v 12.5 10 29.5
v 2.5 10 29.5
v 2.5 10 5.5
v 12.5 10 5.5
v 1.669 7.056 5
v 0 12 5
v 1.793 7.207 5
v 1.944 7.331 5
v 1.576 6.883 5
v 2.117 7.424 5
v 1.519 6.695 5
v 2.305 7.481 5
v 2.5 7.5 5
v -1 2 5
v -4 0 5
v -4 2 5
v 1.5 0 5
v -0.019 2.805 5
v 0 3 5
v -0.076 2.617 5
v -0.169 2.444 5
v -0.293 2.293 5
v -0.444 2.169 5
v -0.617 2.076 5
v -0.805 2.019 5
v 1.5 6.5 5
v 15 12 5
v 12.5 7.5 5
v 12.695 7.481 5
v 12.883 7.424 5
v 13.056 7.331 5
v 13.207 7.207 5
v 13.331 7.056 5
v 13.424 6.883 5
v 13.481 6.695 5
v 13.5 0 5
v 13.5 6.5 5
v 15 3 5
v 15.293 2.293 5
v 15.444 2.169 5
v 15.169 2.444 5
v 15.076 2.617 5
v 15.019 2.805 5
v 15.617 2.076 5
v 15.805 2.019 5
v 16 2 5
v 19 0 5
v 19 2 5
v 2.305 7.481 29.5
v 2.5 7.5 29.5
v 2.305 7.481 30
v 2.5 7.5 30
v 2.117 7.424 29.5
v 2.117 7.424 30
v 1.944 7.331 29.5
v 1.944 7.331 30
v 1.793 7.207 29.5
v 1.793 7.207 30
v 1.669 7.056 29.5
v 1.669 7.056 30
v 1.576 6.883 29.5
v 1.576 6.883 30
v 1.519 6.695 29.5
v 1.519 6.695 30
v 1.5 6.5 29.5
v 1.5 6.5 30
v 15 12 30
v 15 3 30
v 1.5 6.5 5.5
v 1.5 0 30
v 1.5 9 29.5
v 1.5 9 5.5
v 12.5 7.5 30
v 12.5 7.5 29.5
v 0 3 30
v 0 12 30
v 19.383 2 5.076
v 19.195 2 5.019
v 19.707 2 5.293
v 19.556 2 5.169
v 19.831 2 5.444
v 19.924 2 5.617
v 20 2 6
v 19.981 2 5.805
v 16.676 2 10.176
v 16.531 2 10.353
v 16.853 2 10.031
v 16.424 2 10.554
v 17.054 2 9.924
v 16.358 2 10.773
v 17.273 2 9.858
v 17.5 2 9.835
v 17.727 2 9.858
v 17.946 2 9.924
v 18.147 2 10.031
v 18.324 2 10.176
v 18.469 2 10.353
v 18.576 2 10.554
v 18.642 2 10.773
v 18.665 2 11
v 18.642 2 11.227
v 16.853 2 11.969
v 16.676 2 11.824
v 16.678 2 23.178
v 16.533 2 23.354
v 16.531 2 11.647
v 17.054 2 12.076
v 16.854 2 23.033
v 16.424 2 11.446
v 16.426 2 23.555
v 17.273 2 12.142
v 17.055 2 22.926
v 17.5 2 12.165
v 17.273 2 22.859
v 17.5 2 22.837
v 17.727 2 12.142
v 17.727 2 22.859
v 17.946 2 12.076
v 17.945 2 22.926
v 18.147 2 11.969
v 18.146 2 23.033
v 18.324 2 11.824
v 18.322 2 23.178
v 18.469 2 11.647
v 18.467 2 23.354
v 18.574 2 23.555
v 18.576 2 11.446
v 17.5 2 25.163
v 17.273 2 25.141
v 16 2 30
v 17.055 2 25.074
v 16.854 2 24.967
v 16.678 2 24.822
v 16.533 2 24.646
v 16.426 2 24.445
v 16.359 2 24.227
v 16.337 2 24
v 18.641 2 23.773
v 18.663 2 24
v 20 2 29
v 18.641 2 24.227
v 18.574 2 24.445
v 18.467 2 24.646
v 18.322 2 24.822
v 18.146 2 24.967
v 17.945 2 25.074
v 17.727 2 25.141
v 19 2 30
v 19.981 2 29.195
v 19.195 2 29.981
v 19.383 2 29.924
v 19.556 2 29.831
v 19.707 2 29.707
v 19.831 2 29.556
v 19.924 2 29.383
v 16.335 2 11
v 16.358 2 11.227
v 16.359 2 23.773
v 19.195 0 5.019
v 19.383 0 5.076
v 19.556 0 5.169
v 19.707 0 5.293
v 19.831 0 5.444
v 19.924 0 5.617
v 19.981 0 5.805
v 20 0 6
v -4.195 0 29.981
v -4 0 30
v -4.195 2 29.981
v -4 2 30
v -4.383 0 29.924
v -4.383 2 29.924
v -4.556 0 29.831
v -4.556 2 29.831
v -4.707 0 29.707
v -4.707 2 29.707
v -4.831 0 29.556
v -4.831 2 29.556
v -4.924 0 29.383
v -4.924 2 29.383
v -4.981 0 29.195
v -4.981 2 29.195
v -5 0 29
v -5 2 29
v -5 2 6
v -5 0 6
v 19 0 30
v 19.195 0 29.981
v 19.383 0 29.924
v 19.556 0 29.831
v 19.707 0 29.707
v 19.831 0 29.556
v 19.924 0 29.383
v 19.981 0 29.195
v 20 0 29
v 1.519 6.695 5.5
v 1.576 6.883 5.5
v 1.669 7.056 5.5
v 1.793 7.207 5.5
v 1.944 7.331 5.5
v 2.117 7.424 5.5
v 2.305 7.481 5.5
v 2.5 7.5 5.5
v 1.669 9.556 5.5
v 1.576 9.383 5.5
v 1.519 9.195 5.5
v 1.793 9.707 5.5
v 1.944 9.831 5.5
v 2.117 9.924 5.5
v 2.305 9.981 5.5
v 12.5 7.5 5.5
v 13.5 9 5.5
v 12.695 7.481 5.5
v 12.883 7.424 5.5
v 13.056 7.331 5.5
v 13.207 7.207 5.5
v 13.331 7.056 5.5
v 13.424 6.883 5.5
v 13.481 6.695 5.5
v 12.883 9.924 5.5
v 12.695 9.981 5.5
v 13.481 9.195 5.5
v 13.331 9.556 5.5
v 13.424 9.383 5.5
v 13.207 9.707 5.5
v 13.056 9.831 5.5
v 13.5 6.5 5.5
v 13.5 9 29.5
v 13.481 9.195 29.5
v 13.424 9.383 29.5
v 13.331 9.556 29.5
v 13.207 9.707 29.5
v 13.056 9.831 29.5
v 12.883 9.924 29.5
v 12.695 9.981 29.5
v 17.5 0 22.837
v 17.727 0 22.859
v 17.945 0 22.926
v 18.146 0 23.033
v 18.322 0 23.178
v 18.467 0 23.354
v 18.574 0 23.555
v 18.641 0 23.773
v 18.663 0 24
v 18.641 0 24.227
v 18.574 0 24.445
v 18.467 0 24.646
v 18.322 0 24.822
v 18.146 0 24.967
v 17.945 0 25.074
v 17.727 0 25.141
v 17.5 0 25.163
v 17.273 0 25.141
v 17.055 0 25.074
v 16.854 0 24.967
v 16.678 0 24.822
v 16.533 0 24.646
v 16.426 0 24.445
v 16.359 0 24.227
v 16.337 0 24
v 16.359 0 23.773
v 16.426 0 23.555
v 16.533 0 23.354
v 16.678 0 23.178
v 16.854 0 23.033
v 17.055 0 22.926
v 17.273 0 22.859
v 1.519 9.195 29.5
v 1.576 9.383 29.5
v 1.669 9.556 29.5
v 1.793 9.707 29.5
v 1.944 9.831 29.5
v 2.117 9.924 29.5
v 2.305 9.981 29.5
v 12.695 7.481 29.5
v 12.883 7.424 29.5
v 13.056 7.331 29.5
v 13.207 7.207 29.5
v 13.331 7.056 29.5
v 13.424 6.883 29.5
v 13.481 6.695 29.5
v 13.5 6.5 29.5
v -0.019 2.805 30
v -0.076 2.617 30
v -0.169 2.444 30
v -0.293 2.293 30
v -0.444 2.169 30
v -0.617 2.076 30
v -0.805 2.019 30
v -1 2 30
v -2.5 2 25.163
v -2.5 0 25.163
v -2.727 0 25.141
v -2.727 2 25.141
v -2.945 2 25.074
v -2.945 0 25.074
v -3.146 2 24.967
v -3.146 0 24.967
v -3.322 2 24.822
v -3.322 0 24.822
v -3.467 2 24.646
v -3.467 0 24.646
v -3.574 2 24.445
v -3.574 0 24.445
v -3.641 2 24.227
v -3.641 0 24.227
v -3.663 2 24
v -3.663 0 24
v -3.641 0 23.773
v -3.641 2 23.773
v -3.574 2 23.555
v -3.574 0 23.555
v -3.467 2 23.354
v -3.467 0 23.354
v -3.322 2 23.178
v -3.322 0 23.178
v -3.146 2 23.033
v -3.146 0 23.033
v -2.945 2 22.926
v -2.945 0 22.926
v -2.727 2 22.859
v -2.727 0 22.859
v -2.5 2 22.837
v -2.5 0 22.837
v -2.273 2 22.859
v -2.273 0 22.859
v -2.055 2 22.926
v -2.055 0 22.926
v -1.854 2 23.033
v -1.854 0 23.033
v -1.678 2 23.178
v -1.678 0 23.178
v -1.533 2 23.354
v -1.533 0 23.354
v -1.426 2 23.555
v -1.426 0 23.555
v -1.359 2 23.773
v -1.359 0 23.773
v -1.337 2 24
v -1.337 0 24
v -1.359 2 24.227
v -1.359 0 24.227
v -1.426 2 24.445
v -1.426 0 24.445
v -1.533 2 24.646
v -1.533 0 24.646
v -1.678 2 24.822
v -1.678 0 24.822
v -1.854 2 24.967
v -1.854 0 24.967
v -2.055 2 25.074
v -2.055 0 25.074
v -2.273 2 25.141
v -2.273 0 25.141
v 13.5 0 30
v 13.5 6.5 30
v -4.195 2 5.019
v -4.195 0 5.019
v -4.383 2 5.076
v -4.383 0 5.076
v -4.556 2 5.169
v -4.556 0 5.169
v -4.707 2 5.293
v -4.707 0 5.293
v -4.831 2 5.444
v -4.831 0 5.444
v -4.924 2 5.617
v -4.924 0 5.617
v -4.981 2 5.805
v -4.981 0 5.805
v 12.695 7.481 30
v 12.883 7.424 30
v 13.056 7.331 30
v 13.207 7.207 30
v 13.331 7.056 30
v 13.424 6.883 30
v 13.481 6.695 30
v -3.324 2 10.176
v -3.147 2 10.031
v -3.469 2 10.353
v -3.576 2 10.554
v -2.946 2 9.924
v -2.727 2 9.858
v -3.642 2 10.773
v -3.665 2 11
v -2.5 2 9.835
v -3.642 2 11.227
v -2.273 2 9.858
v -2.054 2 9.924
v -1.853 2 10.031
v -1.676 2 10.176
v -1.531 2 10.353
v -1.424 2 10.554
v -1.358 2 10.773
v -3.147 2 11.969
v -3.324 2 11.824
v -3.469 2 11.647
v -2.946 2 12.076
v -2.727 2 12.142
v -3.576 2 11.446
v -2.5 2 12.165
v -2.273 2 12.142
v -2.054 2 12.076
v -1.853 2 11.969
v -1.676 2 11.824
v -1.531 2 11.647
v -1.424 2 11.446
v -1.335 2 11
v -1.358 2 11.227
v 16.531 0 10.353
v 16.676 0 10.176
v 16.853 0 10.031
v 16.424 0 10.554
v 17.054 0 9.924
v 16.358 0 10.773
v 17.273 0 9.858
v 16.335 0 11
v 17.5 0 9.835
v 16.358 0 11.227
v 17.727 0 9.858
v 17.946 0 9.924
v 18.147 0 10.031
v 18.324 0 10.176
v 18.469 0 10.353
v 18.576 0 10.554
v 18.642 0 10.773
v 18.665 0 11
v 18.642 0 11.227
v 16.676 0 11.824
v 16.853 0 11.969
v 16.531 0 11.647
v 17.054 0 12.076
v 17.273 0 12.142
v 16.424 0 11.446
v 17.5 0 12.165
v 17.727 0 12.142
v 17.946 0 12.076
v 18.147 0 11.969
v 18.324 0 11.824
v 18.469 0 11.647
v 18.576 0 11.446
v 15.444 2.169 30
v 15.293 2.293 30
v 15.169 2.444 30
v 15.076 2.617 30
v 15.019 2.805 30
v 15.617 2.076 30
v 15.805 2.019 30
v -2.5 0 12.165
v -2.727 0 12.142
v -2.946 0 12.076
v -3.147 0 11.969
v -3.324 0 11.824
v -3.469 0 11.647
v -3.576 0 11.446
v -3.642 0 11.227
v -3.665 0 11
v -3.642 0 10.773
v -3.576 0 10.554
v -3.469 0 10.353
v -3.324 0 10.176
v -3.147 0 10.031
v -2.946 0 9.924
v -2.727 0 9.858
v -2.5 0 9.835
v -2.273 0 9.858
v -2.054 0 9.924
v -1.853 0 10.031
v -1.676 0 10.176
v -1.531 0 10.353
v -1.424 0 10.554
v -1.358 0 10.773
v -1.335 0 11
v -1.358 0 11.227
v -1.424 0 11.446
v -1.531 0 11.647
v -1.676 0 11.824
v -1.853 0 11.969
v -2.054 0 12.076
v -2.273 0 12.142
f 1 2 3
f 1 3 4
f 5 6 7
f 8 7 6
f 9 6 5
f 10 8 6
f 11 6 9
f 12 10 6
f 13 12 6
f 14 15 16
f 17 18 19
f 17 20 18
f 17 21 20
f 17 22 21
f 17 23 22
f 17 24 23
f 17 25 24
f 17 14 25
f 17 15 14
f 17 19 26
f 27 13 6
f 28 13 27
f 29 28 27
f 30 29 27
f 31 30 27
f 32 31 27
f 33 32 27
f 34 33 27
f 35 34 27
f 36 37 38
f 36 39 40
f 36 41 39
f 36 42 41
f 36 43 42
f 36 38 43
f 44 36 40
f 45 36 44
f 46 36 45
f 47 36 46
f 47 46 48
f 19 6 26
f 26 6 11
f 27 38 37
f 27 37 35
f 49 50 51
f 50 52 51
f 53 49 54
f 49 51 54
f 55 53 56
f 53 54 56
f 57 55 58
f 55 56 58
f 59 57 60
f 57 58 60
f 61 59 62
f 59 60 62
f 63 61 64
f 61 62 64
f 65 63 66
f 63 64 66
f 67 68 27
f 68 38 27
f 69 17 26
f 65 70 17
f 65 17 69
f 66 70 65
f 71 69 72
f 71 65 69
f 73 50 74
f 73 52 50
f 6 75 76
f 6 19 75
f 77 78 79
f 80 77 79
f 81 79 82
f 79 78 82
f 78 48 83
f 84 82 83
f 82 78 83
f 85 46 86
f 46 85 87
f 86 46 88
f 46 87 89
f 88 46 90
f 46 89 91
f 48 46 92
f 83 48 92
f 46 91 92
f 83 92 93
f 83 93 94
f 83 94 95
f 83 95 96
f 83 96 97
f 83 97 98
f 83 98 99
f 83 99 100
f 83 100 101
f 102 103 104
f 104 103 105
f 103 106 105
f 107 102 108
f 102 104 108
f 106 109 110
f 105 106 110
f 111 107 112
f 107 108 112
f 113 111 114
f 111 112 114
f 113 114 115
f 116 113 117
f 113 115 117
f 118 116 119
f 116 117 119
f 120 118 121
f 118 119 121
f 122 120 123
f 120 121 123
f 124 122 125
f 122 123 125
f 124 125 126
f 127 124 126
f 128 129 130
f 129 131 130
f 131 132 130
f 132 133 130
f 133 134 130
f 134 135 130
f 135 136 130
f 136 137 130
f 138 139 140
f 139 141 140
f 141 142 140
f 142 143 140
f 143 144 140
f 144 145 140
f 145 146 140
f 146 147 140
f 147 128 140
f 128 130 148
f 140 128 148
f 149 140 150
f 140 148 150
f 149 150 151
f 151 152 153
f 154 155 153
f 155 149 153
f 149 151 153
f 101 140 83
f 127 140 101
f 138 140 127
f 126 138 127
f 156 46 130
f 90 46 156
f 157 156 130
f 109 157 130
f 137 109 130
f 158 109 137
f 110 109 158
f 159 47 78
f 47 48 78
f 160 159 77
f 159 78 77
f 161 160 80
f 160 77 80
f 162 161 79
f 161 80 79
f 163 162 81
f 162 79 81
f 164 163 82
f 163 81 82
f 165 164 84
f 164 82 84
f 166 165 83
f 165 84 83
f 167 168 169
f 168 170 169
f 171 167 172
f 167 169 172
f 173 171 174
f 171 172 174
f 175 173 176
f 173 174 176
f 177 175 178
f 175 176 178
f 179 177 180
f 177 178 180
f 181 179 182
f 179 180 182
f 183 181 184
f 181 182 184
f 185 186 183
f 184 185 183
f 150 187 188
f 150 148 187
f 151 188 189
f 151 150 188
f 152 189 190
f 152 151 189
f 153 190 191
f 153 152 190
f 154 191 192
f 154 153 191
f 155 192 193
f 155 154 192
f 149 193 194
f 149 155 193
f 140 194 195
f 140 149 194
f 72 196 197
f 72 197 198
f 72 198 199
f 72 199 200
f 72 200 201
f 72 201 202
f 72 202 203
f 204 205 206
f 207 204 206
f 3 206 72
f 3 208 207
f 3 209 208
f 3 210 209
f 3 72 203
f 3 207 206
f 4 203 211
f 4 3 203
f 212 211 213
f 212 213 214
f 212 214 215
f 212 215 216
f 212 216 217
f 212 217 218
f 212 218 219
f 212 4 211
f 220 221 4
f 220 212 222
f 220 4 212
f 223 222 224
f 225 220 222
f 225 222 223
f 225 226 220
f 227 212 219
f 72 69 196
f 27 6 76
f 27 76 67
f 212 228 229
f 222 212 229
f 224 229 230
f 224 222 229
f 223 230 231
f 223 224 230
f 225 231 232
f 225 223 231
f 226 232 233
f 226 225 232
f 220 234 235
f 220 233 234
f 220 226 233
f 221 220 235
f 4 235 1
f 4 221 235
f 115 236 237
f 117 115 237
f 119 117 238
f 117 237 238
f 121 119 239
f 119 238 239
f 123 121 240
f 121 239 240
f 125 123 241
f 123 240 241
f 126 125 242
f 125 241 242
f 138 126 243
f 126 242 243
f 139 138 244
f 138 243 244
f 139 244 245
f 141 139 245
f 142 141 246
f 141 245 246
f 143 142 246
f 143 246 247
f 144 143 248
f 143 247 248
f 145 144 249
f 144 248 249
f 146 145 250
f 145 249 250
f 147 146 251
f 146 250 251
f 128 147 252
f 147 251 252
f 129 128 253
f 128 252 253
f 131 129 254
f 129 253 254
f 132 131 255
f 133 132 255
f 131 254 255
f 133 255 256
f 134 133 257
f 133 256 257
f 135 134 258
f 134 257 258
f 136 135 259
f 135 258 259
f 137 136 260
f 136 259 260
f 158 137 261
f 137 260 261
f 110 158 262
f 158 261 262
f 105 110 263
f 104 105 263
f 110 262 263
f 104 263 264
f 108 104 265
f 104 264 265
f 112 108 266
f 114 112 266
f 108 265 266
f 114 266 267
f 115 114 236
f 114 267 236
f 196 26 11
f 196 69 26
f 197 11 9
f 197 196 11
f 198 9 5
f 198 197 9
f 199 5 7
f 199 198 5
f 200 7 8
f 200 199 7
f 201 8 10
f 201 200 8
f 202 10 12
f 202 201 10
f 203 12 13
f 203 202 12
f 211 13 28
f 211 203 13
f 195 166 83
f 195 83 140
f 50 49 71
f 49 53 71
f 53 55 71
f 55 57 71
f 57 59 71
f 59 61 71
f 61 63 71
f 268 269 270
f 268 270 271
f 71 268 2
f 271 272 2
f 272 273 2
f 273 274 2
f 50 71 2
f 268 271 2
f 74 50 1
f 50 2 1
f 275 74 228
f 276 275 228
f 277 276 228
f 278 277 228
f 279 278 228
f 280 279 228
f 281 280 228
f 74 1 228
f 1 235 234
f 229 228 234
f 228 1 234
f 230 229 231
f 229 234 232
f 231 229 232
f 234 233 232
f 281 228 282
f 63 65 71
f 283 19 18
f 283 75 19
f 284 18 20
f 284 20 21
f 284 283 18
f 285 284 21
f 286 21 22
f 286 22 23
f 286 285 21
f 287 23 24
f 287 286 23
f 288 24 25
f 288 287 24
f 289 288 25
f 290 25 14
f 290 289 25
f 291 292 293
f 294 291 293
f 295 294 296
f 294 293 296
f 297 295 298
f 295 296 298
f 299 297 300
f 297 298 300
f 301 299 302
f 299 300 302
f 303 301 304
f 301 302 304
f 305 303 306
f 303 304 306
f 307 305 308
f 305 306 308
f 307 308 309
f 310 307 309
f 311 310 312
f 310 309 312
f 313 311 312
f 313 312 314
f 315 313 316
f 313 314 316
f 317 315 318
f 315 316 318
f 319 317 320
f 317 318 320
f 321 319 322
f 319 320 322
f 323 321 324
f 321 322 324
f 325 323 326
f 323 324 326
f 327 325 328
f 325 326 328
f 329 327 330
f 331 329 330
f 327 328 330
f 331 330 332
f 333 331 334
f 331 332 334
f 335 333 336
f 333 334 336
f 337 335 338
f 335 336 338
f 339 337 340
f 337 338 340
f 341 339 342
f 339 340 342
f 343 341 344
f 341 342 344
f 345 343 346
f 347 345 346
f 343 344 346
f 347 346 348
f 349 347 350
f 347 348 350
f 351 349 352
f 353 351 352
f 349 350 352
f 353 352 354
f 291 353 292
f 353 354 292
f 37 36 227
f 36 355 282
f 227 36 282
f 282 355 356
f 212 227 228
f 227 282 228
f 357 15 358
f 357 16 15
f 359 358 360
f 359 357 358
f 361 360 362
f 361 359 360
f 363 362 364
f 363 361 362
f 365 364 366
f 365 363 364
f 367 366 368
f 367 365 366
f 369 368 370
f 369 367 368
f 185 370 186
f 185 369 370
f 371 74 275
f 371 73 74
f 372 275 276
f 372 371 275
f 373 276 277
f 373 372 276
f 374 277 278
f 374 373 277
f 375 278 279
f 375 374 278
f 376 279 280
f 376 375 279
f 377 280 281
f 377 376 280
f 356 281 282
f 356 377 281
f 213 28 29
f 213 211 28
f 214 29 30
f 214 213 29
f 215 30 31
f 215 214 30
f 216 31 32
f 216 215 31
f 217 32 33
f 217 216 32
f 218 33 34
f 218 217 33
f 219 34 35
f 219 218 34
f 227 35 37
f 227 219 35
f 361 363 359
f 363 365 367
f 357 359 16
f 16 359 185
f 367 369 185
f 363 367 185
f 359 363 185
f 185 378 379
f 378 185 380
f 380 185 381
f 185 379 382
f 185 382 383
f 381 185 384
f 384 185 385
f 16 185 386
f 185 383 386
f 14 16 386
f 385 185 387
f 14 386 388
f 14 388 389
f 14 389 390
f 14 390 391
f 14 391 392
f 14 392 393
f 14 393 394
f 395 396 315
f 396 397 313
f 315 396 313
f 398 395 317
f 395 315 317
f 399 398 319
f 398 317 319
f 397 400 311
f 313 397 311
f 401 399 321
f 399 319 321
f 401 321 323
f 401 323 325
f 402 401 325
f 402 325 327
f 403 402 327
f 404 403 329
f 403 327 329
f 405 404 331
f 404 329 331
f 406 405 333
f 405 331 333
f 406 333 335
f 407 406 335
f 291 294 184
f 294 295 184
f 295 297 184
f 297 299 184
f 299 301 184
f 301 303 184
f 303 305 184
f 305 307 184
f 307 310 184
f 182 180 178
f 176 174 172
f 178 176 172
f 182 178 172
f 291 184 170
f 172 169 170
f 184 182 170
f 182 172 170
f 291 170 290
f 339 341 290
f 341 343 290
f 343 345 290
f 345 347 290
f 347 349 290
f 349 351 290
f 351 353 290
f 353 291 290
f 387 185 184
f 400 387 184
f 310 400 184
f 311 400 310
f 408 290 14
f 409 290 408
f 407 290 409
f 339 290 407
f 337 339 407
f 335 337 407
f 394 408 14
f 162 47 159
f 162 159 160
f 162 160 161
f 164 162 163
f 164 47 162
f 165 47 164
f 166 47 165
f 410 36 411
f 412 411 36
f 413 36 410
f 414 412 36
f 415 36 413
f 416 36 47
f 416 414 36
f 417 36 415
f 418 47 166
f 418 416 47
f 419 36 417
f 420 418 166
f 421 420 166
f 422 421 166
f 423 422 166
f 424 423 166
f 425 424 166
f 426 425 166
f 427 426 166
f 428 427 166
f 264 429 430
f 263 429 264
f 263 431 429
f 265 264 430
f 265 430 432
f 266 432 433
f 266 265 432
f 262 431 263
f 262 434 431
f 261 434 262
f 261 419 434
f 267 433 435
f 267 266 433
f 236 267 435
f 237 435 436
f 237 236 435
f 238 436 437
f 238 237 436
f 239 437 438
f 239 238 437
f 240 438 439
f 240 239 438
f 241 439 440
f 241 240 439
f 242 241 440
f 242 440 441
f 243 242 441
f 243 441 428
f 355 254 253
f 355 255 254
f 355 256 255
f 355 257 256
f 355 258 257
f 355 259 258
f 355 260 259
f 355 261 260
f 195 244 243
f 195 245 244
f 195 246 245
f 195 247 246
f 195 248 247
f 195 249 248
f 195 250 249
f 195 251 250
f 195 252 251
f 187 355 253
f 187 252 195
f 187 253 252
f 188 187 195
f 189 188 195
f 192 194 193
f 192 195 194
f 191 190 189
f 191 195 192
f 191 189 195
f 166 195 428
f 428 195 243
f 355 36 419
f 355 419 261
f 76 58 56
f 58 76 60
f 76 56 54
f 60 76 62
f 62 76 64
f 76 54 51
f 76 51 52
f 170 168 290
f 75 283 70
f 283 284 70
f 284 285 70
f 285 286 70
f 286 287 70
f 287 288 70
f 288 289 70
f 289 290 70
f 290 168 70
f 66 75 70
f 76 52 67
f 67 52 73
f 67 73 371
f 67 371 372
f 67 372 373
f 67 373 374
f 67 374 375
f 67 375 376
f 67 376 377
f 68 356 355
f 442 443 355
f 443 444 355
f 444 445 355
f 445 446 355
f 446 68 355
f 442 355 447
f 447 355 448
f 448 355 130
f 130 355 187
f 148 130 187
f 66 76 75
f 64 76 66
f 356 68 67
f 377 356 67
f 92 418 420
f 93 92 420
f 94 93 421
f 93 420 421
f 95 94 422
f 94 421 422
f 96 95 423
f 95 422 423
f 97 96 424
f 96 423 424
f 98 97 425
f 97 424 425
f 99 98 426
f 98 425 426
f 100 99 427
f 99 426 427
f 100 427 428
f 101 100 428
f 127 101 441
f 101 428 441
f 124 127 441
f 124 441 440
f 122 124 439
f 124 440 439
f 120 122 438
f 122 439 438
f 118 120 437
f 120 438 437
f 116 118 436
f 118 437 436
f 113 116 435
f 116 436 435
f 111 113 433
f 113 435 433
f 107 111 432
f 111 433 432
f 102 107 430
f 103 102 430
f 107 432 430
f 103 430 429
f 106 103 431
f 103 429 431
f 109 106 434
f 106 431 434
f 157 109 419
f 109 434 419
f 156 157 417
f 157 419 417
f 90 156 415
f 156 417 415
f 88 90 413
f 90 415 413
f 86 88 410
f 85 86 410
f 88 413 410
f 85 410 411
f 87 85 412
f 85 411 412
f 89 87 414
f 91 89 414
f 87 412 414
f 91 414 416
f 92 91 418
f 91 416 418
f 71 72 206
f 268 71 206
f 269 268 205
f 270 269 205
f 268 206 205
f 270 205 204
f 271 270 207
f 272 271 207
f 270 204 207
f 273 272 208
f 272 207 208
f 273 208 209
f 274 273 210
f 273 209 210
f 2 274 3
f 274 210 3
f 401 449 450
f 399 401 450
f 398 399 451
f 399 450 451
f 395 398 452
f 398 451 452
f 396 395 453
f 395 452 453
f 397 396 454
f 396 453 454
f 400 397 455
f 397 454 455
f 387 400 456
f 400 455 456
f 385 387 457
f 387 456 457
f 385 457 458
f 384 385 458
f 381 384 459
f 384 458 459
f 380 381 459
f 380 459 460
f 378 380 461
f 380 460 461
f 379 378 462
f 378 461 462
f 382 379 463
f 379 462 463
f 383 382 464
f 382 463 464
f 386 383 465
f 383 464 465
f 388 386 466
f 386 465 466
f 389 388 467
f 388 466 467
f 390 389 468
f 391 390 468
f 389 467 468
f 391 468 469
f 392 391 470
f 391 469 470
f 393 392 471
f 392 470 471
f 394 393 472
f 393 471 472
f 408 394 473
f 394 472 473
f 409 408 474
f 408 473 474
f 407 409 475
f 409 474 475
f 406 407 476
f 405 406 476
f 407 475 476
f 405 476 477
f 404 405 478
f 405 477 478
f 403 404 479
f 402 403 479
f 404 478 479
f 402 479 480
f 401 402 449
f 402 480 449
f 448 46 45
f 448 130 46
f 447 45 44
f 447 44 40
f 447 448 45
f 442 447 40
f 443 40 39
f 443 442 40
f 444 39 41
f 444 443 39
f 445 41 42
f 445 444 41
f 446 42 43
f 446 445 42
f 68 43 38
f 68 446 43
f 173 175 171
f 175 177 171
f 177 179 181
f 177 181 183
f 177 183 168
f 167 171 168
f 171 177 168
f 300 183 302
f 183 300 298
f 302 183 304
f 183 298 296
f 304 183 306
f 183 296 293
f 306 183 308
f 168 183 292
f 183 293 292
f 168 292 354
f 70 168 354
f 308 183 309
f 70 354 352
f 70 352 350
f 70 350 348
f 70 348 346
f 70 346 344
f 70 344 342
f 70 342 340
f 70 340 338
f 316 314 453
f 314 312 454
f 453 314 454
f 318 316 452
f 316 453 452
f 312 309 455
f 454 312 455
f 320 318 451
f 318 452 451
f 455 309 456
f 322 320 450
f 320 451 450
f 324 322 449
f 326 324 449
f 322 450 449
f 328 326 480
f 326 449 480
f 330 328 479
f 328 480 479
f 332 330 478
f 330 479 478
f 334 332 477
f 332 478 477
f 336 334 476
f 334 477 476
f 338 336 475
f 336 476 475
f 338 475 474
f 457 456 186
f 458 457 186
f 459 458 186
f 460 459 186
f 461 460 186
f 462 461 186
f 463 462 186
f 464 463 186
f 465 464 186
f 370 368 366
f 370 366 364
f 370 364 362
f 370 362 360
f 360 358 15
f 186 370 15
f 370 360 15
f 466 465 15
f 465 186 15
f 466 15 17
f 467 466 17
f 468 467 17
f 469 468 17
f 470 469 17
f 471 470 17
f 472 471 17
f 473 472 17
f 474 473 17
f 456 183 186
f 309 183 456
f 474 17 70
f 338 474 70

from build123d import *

# Parameters (mm, degrees)
SKETCH1_W               = 15
SKETCH1_H               = 12
BOSS_EXTRUDE1_DEPTH     = 30
SKETCH3_W               = 12
SKETCH3_H               = 10
CUT_EXTRUDE1_DEPTH      = 30
FILLET1_R               = 1
SKETCH4_W               = 12
SKETCH4_H               = 0.5
BOSS_EXTRUDE3_DEPTH     = 2.5
CUT_EXTRUDE2_DEPTH      = 36.623026261
CUT_EXTRUDE2_DEPTH_BACK = 36.623026261
SKETCH5_W               = 15
SKETCH5_H               = 5
SKETCH6_W               = 5
SKETCH6_H               = 25
SKETCH6_R               = 1.162975042
SKETCH6_R_2             = 1.164851314
BOSS_EXTRUDE4_DEPTH     = 2
FILLET2_R               = 1


with BuildPart() as part:
    # Sketch1 → Boss-Extrude1 (new body)
    with BuildSketch(Plane.XY):
        with Locations((7.5, 6)):
            Rectangle(SKETCH1_W, SKETCH1_H)
    extrude(amount=BOSS_EXTRUDE1_DEPTH)

    # Sketch3 → Cut-Extrude1 (cut)
    with BuildSketch(Plane.XY.offset(30)):
        with Locations((7.5, 5)):
            Rectangle(SKETCH3_W, SKETCH3_H)
    extrude(amount=-CUT_EXTRUDE1_DEPTH, mode=Mode.SUBTRACT)

    # Fillet1
    fillet1_edges = [part.edges().sort_by_distance(p)[0] for p in [
        (1.5, 10, 15),
        (13.5, 10, 15),
    ]]
    fillet(fillet1_edges, radius=FILLET1_R)

    # Sketch4 → Boss-Extrude3 (add)
    with BuildSketch(Plane.XZ.offset(-10)):
        with Locations((7.5, 29.75)):
            Rectangle(SKETCH4_W, SKETCH4_H)
        with Locations((7.5, 5.25)):
            Rectangle(SKETCH4_W, SKETCH4_H)
    extrude(amount=BOSS_EXTRUDE3_DEPTH)

    # Sketch5 → Cut-Extrude2 (cut, two sides: drawn at the far end of the back side and taken through both)
    with BuildSketch(Plane.XZ.offset(-CUT_EXTRUDE2_DEPTH_BACK)):
        with Locations((7.5, 2.5)):
            Rectangle(SKETCH5_W, SKETCH5_H)
    extrude(amount=CUT_EXTRUDE2_DEPTH + CUT_EXTRUDE2_DEPTH_BACK, mode=Mode.SUBTRACT)

    # Sketch6 → Boss-Extrude4 (add)
    # profile 1 of 2: a face of its own
    with BuildSketch(Plane.XZ):
        with Locations((17.5, 17.5)):
            Rectangle(SKETCH6_W, SKETCH6_H)
        with Locations(Location((17.5, 24, 0), (0, 0, 270))):
            Circle(SKETCH6_R, mode=Mode.SUBTRACT)
        with Locations(Location((17.5, 11, 0), (0, 0, 270))):
            Circle(SKETCH6_R_2, mode=Mode.SUBTRACT)
    # profile 2 of 2: a face of its own
    with BuildSketch(Plane.XZ):
        with Locations((-2.5, 17.5)):
            Rectangle(SKETCH6_W, SKETCH6_H)
        with Locations(Location((-2.5, 11, 0), (0, 0, 90))):
            Circle(SKETCH6_R_2, mode=Mode.SUBTRACT)
        with Locations(Location((-2.5, 24, 0), (0, 0, 90))):
            Circle(SKETCH6_R, mode=Mode.SUBTRACT)
    extrude(amount=-BOSS_EXTRUDE4_DEPTH)

    # Fillet2
    fillet2_edges = [part.edges().sort_by_distance(p)[0] for p in [
        (15, 2, 17.5),
        (20, 1, 30),
        (20, 1, 5),
        (0, 2, 17.5),
        (-5, 1, 5),
        (-5, 1, 30),
        (13.5, 7.5, 29.75),
        (1.5, 7.5, 29.75),
        (13.5, 7.5, 5.25),
        (1.5, 7.5, 5.25),
    ]]
    fillet(fillet2_edges, radius=FILLET2_R)


solid = part.part
